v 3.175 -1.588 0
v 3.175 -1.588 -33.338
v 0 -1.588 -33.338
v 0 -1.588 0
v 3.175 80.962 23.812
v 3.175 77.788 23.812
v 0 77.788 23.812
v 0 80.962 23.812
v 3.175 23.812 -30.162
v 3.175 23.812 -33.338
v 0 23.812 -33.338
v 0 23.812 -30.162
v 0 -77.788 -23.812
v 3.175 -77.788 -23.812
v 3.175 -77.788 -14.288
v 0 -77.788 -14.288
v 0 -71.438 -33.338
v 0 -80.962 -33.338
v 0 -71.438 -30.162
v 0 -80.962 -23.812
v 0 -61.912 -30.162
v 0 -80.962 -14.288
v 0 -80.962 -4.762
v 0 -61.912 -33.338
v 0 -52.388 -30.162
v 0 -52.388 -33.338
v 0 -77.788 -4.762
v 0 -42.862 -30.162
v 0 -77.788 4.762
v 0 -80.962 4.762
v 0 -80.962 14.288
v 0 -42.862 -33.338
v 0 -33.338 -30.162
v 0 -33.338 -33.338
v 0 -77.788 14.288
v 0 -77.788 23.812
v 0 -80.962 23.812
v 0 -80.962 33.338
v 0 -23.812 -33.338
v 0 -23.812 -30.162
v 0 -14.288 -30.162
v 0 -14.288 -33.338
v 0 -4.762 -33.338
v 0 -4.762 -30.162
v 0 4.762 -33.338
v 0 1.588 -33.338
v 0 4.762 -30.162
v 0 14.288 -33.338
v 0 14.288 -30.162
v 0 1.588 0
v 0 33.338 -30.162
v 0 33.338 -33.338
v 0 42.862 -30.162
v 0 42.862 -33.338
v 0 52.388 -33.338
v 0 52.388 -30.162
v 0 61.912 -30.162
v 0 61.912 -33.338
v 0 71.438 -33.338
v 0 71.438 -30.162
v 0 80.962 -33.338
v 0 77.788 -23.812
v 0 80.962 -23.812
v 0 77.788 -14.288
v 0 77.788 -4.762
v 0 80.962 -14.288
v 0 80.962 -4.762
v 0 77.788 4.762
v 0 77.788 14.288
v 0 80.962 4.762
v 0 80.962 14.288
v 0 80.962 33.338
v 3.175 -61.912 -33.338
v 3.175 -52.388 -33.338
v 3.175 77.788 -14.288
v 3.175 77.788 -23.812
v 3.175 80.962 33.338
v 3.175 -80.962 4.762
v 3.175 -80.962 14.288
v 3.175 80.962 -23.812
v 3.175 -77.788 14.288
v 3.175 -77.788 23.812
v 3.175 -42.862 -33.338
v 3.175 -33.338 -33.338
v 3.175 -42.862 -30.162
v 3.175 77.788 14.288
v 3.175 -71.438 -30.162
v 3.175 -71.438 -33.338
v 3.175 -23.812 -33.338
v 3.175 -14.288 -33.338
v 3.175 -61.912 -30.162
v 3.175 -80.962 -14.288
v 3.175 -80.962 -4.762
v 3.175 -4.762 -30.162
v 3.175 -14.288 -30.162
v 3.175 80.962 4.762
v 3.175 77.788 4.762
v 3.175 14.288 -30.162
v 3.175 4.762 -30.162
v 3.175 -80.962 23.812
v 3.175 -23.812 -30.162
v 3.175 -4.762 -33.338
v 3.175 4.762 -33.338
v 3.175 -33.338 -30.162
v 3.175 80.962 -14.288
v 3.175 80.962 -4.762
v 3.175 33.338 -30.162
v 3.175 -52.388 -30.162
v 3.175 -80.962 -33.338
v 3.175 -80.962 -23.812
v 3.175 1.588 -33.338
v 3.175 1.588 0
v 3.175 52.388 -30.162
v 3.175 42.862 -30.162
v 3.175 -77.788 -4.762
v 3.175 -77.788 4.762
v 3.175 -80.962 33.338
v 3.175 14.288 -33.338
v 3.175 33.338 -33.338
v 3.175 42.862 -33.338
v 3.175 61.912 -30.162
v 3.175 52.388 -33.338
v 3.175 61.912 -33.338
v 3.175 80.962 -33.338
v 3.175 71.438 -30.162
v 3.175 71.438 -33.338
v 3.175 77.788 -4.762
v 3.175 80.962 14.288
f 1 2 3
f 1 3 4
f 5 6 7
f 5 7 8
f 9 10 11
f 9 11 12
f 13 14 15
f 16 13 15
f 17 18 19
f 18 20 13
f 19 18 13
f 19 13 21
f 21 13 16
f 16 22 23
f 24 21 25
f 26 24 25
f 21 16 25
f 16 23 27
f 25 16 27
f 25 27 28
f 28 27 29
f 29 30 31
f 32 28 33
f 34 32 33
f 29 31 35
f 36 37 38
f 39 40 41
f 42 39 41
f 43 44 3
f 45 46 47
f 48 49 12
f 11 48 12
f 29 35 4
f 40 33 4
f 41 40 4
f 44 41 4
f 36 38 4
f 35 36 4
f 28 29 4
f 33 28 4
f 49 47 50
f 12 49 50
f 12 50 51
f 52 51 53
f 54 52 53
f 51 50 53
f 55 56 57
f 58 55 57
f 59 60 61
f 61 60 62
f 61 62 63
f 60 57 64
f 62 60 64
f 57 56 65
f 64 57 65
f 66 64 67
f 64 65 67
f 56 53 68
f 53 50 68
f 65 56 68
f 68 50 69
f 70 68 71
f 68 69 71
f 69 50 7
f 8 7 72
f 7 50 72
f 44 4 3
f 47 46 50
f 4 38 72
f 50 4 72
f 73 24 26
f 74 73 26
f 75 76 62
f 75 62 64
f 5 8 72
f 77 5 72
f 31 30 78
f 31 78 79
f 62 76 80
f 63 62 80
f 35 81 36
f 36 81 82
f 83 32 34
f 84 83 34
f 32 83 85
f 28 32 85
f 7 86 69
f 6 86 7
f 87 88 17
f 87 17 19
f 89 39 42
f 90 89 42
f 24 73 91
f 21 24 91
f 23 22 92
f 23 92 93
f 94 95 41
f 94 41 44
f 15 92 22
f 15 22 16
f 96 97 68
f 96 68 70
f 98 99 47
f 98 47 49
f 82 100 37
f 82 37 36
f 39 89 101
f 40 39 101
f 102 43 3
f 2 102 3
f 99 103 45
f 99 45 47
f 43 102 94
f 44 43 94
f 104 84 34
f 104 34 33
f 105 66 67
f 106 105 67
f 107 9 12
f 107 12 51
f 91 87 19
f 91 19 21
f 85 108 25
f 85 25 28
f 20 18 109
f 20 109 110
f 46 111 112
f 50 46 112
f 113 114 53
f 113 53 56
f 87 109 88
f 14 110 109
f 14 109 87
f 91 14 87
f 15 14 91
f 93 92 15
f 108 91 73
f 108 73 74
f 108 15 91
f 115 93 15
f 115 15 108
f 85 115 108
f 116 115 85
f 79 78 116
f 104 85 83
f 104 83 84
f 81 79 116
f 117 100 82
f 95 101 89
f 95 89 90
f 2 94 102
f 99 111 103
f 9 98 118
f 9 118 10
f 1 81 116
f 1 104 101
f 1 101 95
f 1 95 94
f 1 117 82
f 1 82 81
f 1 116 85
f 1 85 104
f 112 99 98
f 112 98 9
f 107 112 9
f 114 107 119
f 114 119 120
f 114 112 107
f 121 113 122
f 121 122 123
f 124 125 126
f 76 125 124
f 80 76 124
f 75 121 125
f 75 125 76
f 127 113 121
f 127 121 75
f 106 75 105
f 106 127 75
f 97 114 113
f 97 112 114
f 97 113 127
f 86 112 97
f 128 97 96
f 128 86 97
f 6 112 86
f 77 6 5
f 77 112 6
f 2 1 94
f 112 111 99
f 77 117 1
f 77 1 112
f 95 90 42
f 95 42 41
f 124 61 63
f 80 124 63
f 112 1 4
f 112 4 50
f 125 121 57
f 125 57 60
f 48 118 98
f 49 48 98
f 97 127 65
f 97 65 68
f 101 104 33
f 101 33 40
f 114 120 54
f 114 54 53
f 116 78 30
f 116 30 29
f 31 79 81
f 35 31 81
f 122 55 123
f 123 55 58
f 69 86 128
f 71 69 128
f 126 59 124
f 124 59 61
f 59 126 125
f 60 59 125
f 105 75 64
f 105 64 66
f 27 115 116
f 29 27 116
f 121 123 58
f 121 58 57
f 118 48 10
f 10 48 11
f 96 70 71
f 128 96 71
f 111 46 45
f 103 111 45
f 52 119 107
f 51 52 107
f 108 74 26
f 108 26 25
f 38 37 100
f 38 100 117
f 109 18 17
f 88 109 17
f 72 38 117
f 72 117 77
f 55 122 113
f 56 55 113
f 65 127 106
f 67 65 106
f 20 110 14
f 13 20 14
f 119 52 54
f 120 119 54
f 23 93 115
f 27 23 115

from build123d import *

# Parameters (mm, degrees)
F0_W     = 161.925
F0_H     = 66.675
F1_DEPTH = 3.175
F2_W     = 3.175
F2_H     = 9.525
F3_DEPTH = 3.176
F4_W     = 9.525
F4_H     = 3.175
F5_DEPTH = 3.176
F6_W     = 3.175
F6_H     = 33.3375
F7_DEPTH = 3.176


with BuildPart() as f1:
    # F0 (on Right) → F1 (new body)
    with BuildSketch(Plane.YZ):
        Rectangle(F0_W, F0_H)
    extrude(amount=F1_DEPTH)

    # F2 (on face) → F3 (cut, through all)
    with BuildSketch(Plane.YZ.offset(3.175)):
        with Locations((-79.375, -19.05)):
            Rectangle(F2_W, F2_H)
        with Locations((-79.375, 0)):
            Rectangle(F2_W, F2_H)
        with Locations((-79.375, 19.05)):
            Rectangle(F2_W, F2_H)
        with Locations((79.375, -19.05)):
            Rectangle(F2_W, F2_H)
        with Locations((79.375, 0)):
            Rectangle(F2_W, F2_H)
        with Locations((79.375, 19.05)):
            Rectangle(F2_W, F2_H)
    extrude(amount=-F3_DEPTH, mode=Mode.SUBTRACT)

    # F4 (on face) → F5 (cut, through all)
    with BuildSketch(Plane.YZ.offset(3.175)):
        with Locations((-66.675, -31.75)):
            Rectangle(F4_W, F4_H)
        with Locations((-47.625, -31.75)):
            Rectangle(F4_W, F4_H)
        with Locations((-28.575, -31.75)):
            Rectangle(F4_W, F4_H)
        with Locations((-9.525, -31.75)):
            Rectangle(F4_W, F4_H)
        with Locations((9.525, -31.75)):
            Rectangle(F4_W, F4_H)
        with Locations((28.575, -31.75)):
            Rectangle(F4_W, F4_H)
        with Locations((47.625, -31.75)):
            Rectangle(F4_W, F4_H)
        with Locations((66.675, -31.75)):
            Rectangle(F4_W, F4_H)
    extrude(amount=-F5_DEPTH, mode=Mode.SUBTRACT)

    # F6 (on face) → F7 (cut, through all)
    with BuildSketch(Plane.YZ.offset(3.175)):
        with Locations((0, -16.66875)):
            Rectangle(F6_W, F6_H)
    extrude(amount=-F7_DEPTH, mode=Mode.SUBTRACT)


solid = f1.part
